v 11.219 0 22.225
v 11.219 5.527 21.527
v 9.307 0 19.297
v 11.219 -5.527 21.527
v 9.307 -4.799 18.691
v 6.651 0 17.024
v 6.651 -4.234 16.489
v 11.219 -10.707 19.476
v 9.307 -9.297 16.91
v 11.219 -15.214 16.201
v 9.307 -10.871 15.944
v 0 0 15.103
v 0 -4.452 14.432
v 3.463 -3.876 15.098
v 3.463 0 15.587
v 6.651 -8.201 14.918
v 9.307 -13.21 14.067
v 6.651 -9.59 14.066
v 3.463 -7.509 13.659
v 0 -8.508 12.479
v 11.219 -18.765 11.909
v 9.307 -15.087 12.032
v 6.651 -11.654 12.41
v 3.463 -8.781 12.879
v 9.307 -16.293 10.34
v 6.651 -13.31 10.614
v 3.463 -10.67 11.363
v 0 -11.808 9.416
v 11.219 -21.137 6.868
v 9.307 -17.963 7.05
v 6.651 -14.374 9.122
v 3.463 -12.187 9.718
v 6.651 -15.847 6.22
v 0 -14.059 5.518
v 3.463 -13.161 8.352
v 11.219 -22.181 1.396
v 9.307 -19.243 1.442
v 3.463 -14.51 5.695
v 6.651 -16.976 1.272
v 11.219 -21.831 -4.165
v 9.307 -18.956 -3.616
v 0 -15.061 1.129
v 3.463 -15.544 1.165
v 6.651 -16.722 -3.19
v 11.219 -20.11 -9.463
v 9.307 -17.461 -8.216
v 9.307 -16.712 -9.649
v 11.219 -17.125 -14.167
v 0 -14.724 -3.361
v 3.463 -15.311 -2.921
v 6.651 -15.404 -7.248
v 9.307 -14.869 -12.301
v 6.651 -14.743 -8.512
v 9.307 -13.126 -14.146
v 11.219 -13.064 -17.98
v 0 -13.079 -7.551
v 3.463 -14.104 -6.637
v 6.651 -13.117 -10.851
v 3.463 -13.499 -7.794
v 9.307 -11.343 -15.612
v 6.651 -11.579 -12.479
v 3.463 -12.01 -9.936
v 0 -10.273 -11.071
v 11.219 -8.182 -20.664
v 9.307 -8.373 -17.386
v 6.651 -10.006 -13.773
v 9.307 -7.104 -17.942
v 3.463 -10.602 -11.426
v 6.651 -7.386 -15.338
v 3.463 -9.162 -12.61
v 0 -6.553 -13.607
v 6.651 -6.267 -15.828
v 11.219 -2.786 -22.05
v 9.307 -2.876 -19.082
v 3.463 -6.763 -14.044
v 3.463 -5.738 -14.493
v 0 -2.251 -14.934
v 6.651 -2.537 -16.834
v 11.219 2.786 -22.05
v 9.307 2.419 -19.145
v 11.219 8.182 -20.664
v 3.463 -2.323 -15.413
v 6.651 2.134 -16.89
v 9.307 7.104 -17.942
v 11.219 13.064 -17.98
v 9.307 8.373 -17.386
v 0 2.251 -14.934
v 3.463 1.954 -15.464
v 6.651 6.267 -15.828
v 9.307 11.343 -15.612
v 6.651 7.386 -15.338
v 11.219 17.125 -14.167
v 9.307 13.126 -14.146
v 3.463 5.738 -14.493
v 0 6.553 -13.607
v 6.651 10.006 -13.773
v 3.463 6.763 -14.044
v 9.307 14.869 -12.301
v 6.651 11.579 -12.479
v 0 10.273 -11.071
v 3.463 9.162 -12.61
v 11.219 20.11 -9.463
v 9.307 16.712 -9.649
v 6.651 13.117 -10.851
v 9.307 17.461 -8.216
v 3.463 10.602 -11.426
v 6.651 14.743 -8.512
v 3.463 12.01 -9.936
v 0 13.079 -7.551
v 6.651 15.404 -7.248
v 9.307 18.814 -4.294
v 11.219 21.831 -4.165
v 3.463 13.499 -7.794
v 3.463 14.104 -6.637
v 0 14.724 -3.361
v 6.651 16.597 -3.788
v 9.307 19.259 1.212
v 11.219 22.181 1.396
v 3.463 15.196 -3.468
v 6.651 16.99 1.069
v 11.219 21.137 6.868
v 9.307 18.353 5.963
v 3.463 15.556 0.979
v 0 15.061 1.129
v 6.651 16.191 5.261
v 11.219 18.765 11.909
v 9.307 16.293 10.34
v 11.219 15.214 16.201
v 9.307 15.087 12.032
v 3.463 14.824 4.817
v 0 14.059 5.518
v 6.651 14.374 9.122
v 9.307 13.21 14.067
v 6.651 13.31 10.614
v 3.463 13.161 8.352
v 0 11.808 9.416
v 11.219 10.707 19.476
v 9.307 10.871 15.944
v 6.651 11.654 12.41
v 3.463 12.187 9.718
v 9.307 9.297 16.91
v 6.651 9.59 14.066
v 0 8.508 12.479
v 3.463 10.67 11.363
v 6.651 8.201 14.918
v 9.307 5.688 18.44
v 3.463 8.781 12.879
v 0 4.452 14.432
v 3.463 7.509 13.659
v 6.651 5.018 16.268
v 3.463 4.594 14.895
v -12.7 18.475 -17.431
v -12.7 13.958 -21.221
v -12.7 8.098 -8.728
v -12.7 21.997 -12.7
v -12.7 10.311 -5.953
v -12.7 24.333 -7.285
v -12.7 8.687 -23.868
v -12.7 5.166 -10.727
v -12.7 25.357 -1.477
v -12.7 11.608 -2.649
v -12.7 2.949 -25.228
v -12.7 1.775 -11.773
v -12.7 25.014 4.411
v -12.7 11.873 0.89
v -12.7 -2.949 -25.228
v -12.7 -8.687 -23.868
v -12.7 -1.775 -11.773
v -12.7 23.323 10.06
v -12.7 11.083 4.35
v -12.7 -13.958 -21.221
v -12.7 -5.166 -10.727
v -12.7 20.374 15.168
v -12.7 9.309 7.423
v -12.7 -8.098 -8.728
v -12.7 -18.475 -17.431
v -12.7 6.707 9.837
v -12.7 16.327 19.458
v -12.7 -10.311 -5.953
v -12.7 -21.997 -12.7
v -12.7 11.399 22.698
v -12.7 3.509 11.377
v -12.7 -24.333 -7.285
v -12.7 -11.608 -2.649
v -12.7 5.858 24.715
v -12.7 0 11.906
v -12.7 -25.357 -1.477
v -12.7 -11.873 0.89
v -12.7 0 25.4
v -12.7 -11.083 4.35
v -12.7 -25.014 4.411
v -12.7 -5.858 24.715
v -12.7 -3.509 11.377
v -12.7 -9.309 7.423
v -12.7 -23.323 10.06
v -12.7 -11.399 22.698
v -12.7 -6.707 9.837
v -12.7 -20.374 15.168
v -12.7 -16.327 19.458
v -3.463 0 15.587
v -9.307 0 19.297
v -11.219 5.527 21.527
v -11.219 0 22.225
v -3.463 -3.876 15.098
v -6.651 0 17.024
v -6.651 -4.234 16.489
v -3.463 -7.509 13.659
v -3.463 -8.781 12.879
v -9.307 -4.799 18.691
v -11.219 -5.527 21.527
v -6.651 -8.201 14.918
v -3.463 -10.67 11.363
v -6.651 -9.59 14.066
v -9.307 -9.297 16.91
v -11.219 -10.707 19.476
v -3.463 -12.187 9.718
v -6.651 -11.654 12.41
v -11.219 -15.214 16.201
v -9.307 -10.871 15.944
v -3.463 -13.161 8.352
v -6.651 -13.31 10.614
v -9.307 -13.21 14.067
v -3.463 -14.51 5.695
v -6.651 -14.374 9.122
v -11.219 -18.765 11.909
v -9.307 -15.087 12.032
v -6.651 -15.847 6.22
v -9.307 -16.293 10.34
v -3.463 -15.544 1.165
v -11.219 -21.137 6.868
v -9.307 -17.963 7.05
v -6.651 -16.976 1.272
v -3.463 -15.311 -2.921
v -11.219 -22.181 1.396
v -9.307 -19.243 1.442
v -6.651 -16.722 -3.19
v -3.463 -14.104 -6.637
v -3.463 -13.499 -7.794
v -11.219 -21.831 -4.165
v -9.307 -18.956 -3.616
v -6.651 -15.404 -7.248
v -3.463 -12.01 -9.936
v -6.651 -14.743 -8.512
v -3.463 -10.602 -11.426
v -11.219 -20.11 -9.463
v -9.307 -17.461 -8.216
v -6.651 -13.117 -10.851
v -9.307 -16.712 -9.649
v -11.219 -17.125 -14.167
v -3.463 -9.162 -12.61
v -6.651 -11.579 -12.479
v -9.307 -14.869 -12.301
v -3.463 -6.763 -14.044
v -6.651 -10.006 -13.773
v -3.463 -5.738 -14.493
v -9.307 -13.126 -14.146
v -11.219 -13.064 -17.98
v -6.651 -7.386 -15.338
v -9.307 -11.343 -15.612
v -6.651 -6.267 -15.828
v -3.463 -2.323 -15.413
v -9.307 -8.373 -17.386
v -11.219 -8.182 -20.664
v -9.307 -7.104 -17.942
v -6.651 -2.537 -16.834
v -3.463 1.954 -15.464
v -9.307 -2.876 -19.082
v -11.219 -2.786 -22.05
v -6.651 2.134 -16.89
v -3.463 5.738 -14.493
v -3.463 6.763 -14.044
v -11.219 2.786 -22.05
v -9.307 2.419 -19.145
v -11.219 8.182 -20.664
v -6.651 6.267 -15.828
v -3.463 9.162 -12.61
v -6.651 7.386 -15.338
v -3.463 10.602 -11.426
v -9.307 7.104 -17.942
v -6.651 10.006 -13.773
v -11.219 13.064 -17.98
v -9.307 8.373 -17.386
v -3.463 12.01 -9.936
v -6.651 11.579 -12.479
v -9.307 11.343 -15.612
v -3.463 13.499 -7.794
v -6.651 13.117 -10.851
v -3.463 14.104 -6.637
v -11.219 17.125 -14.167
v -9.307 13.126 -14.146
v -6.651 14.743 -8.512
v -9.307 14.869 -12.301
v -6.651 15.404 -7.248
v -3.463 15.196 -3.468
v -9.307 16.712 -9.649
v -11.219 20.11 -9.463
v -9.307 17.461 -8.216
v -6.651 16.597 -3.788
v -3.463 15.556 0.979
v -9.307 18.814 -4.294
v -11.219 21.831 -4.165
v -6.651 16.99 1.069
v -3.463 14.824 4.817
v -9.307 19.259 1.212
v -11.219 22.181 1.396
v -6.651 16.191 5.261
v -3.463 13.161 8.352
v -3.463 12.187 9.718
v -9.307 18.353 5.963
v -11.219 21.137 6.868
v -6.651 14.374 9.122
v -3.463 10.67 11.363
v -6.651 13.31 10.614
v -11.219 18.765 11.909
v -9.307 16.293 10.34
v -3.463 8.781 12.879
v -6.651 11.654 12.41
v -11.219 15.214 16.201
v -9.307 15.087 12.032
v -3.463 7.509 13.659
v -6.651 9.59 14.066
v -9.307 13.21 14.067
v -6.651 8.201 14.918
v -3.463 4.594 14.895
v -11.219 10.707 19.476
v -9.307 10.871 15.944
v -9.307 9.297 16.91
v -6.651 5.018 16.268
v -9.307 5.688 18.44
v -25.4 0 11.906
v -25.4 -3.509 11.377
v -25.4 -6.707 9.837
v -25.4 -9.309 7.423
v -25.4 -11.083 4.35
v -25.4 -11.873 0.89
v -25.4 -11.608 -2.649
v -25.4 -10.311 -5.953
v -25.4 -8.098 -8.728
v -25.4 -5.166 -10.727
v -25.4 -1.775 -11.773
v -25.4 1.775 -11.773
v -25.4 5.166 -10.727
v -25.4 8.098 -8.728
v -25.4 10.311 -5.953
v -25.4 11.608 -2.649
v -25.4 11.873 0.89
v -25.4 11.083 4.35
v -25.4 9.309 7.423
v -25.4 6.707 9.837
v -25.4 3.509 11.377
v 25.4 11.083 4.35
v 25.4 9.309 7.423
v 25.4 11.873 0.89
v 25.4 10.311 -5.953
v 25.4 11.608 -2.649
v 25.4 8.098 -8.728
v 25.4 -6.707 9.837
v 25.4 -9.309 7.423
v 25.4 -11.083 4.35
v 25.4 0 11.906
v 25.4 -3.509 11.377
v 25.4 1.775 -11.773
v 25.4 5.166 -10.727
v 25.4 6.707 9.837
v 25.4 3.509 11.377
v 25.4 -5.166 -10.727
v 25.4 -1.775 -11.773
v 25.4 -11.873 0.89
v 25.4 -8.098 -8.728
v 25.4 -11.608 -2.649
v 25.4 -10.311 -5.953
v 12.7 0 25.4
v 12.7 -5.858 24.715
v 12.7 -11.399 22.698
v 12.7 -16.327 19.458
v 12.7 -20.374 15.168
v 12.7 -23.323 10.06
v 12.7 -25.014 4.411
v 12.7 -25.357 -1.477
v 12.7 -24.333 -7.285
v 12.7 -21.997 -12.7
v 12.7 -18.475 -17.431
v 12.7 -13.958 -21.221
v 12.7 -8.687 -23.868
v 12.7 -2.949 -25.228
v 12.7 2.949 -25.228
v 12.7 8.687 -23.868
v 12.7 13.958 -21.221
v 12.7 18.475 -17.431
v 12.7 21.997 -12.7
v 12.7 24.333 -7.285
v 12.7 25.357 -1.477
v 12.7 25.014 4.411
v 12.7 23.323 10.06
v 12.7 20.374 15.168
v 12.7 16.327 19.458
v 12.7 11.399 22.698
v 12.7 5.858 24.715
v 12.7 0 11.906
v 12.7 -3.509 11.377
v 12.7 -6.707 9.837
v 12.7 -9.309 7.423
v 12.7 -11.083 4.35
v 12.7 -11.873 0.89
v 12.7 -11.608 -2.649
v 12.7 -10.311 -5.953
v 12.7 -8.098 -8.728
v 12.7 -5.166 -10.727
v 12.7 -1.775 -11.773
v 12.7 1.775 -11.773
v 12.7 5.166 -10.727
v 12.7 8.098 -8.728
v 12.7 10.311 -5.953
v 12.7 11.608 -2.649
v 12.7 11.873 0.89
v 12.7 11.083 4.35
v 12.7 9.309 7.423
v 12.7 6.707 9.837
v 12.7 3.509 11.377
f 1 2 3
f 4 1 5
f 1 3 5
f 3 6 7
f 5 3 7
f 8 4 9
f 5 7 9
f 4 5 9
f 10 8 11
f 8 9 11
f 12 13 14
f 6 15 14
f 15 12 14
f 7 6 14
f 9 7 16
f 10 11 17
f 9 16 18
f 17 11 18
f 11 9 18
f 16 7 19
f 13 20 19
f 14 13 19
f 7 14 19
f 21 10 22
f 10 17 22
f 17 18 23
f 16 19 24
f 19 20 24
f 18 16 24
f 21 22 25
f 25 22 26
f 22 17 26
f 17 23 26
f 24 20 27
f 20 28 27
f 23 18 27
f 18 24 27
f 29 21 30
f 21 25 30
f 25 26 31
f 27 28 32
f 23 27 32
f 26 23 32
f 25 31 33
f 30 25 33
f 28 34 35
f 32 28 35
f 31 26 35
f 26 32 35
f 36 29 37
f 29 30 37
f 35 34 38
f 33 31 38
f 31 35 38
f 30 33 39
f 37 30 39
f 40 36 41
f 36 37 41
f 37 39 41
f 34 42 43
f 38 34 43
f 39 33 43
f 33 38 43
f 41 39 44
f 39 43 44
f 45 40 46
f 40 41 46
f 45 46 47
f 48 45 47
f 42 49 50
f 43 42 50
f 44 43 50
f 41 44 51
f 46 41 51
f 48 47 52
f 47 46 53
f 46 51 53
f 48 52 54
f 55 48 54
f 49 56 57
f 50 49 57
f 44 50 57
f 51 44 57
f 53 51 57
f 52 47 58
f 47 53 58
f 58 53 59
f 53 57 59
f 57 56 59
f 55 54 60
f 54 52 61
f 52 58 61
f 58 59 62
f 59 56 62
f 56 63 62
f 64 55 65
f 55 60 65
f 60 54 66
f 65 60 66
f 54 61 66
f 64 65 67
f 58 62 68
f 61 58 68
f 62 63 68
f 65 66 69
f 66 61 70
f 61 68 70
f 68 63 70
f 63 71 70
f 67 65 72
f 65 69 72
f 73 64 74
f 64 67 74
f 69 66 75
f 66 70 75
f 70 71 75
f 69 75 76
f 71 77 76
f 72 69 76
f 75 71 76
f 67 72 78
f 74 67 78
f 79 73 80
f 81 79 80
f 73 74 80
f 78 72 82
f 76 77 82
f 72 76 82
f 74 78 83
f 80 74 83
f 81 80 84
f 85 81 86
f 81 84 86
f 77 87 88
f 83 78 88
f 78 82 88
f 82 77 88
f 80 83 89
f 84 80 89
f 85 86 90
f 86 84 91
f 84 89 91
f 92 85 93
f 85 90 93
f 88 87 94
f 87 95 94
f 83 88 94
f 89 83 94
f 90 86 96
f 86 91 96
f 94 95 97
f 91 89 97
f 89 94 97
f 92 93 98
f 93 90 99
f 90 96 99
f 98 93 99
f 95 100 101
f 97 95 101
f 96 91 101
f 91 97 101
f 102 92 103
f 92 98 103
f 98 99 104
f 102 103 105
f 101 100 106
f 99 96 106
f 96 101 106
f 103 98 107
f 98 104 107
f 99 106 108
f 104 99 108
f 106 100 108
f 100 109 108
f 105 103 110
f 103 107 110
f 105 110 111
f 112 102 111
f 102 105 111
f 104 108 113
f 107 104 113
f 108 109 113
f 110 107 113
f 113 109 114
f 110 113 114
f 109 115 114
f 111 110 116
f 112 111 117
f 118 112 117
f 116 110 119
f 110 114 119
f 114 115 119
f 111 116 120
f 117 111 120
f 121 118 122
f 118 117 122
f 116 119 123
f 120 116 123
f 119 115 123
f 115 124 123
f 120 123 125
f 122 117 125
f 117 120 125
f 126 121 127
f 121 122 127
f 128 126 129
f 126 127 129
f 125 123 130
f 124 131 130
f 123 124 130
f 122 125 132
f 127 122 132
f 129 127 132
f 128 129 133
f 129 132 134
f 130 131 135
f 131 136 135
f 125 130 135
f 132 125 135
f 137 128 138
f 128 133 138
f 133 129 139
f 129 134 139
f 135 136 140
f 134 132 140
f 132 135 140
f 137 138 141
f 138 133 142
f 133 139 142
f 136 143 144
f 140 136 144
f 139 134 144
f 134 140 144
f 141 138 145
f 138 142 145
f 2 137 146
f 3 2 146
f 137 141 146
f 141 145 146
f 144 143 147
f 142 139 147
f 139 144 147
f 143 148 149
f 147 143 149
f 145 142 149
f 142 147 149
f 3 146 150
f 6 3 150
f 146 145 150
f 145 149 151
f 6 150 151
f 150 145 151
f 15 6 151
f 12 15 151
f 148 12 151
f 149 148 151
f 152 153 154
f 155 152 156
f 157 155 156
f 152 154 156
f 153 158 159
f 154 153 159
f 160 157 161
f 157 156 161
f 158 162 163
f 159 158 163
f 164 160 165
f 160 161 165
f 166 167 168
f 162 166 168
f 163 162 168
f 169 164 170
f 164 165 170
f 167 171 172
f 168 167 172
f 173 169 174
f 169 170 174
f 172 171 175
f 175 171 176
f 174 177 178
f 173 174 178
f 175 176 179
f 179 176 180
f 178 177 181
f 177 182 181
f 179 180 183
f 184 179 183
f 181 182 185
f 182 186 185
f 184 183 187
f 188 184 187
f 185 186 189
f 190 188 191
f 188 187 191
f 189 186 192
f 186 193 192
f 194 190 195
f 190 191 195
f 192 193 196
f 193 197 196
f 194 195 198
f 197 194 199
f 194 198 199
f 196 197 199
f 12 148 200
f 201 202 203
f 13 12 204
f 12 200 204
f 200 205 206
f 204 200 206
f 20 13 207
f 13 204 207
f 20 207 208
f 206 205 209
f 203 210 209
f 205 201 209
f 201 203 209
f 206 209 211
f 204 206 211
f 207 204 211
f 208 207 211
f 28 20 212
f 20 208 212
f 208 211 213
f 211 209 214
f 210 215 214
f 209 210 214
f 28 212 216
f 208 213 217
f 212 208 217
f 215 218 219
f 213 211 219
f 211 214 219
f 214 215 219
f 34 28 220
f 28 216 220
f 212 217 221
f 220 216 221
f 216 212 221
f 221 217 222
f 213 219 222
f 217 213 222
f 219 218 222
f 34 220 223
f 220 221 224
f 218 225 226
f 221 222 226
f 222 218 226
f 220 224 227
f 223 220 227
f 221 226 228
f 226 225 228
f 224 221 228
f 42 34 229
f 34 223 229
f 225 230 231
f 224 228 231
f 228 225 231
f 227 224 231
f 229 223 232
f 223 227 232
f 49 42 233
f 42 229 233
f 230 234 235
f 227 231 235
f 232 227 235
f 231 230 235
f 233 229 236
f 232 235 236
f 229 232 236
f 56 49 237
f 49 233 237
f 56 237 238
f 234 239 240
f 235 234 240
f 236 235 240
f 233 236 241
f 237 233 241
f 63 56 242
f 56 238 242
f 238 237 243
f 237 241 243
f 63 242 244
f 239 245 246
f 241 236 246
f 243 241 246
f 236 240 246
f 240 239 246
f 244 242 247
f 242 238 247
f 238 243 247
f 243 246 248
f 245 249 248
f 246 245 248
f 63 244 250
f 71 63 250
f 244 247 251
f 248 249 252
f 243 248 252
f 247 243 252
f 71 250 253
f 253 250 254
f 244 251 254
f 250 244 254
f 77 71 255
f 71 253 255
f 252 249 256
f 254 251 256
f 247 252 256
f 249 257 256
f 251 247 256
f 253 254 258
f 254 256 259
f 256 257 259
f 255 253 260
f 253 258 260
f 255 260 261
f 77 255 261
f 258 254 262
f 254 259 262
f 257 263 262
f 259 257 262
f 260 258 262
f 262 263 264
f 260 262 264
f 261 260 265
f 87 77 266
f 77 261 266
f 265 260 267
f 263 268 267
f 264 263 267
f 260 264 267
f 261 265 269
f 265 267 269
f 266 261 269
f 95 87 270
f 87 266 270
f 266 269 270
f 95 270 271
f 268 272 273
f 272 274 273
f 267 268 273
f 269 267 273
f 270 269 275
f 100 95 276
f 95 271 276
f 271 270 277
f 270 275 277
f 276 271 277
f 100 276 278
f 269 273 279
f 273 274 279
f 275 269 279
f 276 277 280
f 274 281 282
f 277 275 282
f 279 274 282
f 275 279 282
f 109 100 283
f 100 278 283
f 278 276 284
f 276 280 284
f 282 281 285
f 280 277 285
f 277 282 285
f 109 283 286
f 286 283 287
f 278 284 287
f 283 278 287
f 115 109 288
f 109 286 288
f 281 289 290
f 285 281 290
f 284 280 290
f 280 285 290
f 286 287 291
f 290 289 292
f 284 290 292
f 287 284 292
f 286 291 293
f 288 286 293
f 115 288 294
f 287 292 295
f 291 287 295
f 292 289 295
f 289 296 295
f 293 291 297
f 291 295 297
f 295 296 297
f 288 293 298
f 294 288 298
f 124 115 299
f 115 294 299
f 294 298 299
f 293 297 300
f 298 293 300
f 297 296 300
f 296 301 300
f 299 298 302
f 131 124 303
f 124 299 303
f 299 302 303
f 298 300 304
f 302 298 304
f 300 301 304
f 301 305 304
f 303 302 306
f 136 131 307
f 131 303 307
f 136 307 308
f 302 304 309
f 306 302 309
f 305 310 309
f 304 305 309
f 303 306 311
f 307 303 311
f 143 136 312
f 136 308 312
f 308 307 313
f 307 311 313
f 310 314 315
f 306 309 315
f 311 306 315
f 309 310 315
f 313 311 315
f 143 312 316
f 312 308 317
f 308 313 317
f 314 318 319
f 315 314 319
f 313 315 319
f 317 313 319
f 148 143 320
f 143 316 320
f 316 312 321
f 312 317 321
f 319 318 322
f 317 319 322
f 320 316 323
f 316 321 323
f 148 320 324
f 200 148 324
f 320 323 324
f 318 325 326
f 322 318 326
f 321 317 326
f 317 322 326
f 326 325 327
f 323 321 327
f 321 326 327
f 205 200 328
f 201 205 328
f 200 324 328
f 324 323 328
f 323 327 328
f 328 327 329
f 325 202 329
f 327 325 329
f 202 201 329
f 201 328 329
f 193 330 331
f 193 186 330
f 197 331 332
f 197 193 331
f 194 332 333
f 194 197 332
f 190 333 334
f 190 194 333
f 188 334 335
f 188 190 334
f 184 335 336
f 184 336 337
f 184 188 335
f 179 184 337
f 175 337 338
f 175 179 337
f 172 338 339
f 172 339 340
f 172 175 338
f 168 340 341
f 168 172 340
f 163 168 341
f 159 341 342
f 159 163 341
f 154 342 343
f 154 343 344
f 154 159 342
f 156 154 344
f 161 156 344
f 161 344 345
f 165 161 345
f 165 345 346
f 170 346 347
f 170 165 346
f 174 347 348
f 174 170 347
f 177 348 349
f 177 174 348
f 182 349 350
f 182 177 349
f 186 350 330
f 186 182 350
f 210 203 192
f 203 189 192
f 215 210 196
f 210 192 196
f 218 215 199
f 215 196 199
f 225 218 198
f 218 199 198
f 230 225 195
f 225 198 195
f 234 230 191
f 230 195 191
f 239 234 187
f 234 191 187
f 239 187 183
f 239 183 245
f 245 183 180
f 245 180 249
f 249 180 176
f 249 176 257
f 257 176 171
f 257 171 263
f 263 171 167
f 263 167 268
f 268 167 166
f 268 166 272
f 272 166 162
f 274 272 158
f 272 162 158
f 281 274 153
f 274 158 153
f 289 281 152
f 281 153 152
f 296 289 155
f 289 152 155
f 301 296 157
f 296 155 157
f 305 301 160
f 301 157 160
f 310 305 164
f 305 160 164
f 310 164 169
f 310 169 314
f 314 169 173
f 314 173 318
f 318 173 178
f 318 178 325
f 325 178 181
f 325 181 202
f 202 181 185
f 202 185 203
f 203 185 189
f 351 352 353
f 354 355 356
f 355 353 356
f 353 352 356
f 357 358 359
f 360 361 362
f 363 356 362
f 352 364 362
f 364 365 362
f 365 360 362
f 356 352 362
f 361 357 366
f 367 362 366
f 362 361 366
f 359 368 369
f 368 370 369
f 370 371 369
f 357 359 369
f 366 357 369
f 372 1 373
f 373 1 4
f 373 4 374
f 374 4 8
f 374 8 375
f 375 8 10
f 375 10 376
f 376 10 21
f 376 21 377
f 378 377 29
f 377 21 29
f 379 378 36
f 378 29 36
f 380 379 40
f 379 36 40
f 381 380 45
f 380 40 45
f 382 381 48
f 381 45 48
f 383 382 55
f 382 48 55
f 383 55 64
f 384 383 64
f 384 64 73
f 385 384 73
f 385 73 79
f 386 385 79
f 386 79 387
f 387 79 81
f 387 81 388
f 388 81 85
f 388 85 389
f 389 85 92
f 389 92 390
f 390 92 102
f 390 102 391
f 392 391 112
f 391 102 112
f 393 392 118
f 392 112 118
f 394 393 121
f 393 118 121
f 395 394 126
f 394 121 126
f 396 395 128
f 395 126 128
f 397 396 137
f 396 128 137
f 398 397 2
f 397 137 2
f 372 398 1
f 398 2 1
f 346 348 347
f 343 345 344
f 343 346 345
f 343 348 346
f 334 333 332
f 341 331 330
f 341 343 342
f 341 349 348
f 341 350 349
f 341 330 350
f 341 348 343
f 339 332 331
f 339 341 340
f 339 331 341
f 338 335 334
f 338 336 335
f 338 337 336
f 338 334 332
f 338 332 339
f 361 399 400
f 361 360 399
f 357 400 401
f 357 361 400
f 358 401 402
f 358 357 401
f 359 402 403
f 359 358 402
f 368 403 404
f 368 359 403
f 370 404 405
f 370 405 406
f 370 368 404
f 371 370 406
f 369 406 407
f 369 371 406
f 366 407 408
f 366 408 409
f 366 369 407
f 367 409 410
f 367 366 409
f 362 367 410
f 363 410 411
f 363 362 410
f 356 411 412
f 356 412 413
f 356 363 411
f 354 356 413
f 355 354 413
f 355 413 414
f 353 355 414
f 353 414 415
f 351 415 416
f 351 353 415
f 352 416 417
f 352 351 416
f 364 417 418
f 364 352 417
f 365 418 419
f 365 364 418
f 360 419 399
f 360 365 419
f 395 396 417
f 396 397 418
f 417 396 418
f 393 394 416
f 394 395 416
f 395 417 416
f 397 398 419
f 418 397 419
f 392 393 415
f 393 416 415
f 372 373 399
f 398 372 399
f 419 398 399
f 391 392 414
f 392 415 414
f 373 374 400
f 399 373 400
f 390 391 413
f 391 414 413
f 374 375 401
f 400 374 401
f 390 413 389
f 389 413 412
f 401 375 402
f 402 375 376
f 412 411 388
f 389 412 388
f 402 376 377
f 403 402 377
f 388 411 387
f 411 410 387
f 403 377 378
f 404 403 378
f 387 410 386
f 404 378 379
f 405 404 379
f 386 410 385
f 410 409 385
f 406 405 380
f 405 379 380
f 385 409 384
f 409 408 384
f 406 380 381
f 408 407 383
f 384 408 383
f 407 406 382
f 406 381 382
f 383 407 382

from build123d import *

# Parameters (mm, degrees)
F0_W = 12.7
F0_H = 11.90625


with BuildPart() as f1:
    # F0 (on Front) → F1 (revolve)
    with BuildSketch(Plane.XZ):
        with BuildLine():
            Line((-12.7, 11.90625), (-12.7, 0))
            Line((-12.7, 0), (12.7, 0))
            Line((12.7, 0), (12.7, 11.90625))
            Line((12.7, 11.90625), (12.7, 25.4))
            Line((12.7, 25.4), (11.219473, 22.225))
            ThreePointArc((11.219473, 22.225), (6.650816, 17.023914), (0, 15.102826))
            ThreePointArc((0, 15.102826), (-6.650816, 17.023914), (-11.219473, 22.225))
            Line((-11.219473, 22.225), (-12.7, 25.4))
            Line((-12.7, 25.4), (-12.7, 11.90625))
        make_face()
        with Locations((-19.05, 5.953125)):
            Rectangle(F0_W, F0_H)
        with Locations((19.05, 5.953125)):
            Rectangle(F0_W, F0_H)
    revolve(axis=Axis((0, 0, 0), (1, 0, 0)))


solid = f1.part
